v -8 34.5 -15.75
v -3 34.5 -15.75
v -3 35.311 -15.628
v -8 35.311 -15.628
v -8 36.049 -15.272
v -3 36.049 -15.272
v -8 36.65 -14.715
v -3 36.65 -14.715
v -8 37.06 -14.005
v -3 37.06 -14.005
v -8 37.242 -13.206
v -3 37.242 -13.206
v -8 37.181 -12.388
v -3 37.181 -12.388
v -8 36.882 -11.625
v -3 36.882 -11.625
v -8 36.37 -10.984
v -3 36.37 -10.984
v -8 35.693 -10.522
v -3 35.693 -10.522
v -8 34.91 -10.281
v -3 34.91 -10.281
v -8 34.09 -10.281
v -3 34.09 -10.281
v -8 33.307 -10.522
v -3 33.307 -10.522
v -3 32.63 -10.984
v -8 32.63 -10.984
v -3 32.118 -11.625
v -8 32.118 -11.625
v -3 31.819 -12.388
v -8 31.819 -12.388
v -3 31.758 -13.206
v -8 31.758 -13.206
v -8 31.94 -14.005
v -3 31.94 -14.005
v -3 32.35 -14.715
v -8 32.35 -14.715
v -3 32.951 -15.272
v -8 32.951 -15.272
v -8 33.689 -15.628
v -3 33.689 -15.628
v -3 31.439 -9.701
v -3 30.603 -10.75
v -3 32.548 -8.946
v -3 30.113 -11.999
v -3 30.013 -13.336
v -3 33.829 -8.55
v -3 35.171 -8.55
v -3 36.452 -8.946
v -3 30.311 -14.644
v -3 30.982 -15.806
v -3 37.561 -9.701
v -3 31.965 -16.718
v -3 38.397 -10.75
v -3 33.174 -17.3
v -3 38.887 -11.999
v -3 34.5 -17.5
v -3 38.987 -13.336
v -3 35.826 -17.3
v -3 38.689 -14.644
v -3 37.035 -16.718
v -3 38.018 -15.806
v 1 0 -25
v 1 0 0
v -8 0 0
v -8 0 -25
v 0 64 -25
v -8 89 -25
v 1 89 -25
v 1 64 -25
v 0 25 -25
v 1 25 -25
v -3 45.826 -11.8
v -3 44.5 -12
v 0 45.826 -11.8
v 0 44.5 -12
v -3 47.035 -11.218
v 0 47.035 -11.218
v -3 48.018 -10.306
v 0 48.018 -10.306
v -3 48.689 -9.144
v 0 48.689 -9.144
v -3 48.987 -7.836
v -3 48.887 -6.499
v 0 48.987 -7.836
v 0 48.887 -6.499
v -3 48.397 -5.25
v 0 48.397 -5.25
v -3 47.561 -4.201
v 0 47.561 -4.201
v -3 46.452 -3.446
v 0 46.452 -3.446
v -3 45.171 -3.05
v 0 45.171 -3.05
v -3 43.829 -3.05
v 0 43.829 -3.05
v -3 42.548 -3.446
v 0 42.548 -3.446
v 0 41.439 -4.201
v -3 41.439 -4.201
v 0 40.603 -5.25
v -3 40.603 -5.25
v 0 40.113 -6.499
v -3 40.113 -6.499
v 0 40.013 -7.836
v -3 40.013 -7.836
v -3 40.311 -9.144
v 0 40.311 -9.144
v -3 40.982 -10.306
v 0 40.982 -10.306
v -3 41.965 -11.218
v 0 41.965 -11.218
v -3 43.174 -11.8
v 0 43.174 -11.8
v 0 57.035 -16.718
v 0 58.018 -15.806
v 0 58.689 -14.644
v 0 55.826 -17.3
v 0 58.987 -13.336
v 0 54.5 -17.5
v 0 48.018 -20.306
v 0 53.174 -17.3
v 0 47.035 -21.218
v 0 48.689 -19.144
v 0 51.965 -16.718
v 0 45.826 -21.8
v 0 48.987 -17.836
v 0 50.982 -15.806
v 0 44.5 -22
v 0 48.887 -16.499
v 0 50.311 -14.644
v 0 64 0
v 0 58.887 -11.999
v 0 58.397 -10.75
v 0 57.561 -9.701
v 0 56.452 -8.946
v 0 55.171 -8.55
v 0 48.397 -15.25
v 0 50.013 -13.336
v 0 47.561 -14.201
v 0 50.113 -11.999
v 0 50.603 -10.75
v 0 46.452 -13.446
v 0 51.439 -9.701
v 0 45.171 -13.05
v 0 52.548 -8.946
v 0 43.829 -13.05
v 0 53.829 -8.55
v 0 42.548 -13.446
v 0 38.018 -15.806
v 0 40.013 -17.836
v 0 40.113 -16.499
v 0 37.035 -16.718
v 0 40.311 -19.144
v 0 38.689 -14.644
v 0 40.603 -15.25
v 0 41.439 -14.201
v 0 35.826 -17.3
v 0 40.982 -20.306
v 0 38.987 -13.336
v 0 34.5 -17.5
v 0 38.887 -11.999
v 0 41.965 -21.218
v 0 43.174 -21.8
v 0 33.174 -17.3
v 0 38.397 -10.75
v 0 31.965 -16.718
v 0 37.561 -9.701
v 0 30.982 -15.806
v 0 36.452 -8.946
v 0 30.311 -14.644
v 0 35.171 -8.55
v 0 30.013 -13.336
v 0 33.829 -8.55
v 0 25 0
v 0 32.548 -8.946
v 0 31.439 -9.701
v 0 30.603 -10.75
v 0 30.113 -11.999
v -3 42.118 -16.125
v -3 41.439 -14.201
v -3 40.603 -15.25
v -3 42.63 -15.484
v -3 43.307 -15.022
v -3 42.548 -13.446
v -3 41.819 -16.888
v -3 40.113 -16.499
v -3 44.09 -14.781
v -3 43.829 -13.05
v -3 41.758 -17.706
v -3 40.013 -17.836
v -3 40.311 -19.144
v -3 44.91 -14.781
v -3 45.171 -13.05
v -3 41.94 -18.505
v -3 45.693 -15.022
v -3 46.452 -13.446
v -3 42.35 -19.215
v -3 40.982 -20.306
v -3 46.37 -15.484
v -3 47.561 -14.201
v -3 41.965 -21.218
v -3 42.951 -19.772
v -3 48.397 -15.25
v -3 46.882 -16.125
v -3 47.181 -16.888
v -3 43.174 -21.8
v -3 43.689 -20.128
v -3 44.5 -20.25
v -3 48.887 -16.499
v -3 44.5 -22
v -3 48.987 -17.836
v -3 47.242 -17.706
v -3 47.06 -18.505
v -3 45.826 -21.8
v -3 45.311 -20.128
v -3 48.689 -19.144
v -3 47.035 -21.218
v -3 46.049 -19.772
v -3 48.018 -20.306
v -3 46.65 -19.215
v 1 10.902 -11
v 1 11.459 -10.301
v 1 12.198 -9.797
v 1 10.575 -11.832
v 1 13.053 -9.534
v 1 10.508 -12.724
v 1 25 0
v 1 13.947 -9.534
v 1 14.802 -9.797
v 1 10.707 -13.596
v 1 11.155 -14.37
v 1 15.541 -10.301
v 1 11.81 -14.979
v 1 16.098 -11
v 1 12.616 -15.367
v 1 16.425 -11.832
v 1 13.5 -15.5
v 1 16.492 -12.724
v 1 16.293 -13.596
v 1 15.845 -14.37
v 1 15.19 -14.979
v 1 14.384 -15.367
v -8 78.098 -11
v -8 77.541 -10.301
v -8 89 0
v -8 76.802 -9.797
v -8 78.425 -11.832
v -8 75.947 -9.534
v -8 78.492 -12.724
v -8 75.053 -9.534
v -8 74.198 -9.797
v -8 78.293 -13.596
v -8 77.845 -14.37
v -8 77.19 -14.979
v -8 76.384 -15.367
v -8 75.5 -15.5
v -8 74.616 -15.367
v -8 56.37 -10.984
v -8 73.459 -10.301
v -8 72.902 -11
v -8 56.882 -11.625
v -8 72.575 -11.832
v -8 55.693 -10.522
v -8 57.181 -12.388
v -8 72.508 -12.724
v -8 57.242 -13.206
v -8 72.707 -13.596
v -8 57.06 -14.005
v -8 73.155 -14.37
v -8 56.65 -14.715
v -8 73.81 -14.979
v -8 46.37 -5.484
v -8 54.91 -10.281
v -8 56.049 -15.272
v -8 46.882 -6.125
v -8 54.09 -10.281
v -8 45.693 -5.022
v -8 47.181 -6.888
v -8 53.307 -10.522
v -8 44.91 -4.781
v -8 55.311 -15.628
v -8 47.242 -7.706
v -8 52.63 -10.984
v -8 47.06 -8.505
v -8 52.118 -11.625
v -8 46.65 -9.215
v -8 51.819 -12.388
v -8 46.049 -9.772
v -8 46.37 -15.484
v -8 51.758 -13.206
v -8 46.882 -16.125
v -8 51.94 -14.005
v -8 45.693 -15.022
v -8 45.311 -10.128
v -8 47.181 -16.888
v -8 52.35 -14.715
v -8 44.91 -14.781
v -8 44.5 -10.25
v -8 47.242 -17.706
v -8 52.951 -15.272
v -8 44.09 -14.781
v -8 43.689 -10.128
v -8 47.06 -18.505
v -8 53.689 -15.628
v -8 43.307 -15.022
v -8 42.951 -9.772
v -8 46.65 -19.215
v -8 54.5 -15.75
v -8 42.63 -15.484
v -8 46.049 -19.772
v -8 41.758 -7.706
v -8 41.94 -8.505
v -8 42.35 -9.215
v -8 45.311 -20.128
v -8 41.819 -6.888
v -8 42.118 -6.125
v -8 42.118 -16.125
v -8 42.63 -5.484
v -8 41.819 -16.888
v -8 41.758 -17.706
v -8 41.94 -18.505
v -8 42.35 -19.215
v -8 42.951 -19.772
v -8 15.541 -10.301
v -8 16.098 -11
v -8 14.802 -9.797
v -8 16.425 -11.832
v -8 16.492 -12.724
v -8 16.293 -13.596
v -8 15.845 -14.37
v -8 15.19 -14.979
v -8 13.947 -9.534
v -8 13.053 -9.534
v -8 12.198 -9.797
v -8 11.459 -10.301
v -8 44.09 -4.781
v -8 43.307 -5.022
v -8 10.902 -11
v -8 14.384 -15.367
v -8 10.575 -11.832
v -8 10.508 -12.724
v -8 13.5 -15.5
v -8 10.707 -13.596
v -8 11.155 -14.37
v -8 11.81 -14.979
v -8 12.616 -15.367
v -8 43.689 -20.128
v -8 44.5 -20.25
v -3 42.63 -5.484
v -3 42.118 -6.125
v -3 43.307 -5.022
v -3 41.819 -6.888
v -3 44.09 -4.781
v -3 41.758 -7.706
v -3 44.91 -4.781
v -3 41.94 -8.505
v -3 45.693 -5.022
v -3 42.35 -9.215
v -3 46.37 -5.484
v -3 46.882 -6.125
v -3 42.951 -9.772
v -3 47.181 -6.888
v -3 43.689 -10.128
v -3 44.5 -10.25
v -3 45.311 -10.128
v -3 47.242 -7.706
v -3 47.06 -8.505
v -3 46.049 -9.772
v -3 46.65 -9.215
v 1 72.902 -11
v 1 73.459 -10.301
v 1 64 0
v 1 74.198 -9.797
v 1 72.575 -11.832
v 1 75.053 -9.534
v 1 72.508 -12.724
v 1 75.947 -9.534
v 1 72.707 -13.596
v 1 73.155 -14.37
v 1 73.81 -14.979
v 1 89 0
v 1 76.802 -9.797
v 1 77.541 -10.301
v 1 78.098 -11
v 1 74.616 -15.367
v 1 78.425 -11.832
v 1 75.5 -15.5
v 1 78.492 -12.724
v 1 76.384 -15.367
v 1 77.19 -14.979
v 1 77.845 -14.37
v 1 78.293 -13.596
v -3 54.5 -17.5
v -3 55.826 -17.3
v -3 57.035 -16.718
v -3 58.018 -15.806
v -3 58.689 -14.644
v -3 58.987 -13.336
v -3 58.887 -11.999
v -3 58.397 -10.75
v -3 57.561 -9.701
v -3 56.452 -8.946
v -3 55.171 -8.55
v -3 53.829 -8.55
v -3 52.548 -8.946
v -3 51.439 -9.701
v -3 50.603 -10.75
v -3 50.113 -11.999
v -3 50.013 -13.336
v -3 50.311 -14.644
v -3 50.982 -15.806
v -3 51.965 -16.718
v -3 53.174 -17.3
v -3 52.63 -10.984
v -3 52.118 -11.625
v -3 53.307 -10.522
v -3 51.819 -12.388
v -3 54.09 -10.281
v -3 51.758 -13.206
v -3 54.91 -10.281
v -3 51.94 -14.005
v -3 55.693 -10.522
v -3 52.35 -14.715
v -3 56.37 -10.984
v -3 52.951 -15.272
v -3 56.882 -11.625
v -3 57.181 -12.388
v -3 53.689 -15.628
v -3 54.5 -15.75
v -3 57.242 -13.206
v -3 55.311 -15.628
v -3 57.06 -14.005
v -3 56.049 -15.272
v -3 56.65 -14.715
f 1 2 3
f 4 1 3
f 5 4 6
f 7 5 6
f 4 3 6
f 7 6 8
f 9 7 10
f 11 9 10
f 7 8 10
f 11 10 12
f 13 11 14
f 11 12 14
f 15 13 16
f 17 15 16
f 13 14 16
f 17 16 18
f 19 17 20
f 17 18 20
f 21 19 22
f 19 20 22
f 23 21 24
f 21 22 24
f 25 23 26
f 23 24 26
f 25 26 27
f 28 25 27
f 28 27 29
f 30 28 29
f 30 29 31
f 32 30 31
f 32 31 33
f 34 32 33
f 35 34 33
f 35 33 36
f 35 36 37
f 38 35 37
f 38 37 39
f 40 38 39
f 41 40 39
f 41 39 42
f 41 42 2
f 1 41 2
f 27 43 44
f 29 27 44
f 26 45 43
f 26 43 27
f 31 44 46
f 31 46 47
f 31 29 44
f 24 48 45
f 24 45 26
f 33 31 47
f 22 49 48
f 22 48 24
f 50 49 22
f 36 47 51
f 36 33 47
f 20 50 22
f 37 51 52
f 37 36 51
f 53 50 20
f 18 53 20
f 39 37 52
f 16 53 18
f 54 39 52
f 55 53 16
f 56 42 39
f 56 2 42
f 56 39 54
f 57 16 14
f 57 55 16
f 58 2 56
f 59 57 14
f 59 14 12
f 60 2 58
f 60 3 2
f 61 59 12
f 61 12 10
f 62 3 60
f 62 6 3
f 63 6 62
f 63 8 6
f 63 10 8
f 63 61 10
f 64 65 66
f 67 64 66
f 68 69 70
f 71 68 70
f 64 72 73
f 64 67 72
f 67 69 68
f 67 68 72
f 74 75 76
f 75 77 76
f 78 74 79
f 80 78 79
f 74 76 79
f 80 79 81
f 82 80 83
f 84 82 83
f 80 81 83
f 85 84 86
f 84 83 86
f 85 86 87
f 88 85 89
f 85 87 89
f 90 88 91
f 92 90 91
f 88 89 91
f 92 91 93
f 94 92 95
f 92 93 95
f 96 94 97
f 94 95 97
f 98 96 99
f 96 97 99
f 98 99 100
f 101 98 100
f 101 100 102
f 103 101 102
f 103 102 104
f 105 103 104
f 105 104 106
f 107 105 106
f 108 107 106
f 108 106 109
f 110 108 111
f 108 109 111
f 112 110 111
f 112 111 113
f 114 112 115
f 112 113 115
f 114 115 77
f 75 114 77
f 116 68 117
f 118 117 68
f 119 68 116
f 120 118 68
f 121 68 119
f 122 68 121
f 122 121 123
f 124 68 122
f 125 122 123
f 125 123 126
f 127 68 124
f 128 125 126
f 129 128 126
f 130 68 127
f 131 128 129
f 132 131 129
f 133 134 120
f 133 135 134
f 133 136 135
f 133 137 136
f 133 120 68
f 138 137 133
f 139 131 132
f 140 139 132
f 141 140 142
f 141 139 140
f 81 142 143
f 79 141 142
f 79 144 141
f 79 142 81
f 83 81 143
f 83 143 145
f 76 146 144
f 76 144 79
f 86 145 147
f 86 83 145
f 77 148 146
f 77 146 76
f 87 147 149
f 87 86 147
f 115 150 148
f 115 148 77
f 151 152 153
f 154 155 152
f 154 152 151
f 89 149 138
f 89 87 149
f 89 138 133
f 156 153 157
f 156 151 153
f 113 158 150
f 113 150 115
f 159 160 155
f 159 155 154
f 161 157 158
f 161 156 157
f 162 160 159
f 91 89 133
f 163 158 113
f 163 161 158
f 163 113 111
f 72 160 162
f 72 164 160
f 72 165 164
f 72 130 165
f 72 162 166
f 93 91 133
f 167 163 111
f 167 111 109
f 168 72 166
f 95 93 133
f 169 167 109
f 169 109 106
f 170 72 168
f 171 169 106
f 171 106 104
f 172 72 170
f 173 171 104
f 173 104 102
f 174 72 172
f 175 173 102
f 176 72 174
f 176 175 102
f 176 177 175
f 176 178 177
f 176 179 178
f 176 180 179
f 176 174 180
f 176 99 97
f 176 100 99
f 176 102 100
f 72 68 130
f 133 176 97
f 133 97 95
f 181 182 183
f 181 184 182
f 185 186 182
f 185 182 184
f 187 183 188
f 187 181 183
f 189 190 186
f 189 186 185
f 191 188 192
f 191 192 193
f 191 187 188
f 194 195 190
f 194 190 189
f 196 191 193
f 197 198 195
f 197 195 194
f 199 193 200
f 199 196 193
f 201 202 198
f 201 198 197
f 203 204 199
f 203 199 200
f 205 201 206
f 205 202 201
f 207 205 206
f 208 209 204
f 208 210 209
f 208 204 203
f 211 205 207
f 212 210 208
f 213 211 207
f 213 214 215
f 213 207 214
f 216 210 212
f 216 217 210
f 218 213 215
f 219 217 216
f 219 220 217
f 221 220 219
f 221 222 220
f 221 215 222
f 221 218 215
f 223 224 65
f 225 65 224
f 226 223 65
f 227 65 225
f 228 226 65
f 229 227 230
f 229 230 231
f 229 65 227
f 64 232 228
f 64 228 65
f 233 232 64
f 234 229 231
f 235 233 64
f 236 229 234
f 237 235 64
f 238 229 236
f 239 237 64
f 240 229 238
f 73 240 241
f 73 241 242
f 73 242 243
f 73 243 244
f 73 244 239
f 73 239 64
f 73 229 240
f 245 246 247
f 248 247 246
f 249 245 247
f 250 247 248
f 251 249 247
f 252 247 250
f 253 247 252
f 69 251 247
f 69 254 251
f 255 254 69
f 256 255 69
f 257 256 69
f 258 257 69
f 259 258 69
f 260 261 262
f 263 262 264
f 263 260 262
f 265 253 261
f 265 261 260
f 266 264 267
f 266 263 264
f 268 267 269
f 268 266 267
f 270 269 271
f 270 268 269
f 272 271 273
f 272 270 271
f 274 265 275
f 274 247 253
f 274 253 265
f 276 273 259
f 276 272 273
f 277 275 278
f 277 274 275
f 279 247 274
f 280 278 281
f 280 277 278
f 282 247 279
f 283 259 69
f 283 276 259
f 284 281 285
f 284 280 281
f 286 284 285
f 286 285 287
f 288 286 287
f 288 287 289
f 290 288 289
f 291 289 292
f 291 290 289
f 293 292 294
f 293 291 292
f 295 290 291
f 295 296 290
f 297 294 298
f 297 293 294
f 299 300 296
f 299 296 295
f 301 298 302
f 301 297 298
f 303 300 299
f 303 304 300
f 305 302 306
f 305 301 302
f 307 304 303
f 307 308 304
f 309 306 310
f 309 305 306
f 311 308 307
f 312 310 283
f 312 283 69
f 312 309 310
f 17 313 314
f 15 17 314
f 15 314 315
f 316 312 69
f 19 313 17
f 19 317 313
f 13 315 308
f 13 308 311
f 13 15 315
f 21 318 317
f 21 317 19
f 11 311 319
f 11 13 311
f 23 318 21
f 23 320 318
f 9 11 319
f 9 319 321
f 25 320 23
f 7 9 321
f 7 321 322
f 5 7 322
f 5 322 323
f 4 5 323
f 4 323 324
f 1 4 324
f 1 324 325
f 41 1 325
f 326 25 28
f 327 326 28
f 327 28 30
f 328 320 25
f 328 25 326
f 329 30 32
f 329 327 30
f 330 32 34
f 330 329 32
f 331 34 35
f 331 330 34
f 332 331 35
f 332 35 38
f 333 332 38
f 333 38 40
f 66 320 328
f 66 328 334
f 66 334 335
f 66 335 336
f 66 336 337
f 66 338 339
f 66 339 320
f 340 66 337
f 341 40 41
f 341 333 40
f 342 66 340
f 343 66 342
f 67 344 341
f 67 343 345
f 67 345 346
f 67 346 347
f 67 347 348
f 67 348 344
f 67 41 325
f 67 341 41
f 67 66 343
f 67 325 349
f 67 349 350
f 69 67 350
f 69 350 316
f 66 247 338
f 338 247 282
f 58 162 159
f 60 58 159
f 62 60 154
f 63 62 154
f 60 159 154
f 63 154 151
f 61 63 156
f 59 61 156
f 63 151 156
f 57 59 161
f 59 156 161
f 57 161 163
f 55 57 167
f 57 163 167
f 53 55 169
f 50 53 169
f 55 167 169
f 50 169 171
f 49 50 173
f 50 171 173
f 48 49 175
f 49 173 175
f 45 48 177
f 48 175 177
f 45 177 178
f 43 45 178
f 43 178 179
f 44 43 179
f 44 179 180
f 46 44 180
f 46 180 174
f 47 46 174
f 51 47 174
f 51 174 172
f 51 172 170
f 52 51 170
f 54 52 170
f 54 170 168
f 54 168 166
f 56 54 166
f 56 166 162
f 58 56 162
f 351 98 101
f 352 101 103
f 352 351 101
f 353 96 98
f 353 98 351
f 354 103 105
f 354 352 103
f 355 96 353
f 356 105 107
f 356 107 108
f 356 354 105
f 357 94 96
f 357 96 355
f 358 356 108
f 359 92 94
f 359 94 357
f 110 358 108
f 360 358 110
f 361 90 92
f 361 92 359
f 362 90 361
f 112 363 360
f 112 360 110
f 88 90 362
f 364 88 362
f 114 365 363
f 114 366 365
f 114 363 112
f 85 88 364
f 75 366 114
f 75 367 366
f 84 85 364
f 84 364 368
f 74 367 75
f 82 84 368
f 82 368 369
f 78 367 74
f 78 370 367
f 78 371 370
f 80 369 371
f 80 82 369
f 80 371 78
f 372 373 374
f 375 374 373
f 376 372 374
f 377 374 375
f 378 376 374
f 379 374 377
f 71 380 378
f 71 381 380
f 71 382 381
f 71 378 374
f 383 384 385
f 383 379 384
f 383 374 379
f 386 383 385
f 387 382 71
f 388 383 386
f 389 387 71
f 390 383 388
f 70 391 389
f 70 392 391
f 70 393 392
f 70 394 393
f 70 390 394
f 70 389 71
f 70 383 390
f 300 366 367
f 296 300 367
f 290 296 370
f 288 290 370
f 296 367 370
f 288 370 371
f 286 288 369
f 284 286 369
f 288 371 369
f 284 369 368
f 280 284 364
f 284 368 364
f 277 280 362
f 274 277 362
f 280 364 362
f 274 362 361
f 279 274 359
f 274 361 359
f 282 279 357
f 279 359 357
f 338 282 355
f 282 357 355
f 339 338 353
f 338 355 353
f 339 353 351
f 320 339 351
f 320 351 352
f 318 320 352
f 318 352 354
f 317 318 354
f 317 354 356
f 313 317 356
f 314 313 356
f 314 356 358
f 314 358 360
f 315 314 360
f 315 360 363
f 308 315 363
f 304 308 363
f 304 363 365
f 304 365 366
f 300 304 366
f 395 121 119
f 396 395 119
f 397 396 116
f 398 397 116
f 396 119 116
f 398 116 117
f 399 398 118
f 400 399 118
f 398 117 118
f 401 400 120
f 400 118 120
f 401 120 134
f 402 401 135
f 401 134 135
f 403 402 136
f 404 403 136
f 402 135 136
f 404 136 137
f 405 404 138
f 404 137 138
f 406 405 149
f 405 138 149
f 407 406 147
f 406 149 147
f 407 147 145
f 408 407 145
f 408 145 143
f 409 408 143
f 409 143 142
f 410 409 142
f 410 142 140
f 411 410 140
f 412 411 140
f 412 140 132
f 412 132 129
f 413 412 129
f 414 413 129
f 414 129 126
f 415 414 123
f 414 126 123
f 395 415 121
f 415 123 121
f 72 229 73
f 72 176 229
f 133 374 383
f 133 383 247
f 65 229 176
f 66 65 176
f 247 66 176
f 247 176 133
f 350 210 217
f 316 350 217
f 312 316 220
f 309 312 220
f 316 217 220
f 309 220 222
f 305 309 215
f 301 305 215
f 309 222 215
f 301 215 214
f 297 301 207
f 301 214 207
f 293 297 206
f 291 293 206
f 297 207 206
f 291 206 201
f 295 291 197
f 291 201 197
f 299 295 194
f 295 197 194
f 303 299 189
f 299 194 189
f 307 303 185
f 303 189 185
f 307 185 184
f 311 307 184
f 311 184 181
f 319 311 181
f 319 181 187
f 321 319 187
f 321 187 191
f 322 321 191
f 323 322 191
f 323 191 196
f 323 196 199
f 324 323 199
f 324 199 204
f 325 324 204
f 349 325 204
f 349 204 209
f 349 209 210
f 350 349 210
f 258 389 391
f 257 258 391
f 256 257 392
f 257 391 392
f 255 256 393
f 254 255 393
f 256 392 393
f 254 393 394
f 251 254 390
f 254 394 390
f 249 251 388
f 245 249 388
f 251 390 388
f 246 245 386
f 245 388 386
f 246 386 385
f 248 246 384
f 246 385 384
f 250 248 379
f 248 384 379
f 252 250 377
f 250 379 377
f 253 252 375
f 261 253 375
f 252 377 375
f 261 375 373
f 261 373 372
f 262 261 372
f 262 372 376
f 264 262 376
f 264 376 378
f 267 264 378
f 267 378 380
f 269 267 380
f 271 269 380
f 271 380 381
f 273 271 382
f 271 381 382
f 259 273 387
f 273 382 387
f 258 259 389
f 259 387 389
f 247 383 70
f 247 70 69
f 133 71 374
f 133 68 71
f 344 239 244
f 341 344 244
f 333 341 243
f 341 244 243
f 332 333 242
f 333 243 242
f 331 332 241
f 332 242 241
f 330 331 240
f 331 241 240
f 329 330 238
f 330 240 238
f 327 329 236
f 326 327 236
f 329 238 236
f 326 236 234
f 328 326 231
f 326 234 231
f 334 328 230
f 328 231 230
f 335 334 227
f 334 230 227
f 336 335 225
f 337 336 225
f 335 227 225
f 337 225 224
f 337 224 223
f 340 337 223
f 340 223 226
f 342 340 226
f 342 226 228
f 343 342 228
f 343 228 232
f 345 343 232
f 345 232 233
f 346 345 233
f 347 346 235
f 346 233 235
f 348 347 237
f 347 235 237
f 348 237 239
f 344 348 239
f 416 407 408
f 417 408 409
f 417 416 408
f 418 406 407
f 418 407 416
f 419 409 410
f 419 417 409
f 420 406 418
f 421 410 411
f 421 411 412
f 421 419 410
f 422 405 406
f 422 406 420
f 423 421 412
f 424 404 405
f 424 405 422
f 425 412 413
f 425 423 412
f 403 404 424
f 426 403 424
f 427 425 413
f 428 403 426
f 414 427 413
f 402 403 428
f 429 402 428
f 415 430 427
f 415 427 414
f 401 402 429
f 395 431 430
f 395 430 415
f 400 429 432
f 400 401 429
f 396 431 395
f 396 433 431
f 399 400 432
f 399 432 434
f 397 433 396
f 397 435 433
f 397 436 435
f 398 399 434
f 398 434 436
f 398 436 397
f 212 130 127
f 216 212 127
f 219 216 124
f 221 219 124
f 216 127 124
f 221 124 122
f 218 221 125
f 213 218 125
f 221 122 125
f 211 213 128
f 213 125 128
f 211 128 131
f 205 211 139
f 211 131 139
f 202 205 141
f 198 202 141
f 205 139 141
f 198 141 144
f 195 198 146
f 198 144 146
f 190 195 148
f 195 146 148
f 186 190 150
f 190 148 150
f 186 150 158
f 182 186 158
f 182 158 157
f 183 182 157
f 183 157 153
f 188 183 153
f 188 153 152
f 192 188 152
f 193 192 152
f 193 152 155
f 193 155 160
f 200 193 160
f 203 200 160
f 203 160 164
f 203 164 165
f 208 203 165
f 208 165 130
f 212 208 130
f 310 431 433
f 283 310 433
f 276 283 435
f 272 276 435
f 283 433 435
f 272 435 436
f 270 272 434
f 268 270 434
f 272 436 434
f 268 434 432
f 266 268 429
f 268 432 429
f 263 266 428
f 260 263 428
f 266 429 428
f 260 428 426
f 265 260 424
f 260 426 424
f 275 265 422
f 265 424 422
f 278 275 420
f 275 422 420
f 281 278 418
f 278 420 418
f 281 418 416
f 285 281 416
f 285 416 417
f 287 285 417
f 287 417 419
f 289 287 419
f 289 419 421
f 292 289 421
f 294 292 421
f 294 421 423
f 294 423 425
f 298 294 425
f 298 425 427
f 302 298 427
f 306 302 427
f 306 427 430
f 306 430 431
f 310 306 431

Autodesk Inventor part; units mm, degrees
ref_plane "YZ Plane" through (0, 0, 0) normal (1, 0, 0) x (0, 1, 0)
ref_plane "XZ Plane" through (0, 0, 0) normal (0, 1, 0) x (-1, 0, 0)
ref_plane "XY Plane" through (0, 0, 0) normal (0, 0, 1) x (1, 0, 0)
sketch "Sketch1" plane through (0, 0, 0) normal (0, 1, 0) x (-1, 0, 0)
  line L0 (0, 0) -> (8, 0)
  line L1 (8, 0) -> (8, -25)
  line L2 (8, -25) -> (0, -25)
  line L3 (0, -25) -> (0, 0)
  dimension "d0" = 8
  dimension "d1" = 25
extrude "Extrusion1" add sketch "Sketch1" along normal blind 89
sketch "Sketch2" plane through (0, 0, 0) normal (1, 0, 0) x (0, 0, -1)
  line L0 (0, 89) -> (25, 89) projected
  line L1 (0, 89) -> (25, 89)
  line L2 (25, 89) -> (25, 64)
  line L3 (25, 64) -> (0, 64)
  line L4 (0, 64) -> (0, 89)
  line L5 (25, 0) -> (25, 89) projected
  line L6 (25, 0) -> (0, 0)
  line L7 (0, 0) -> (0, 25)
  line L8 (0, 25) -> (25, 25)
  line L9 (25, 25) -> (25, 0)
  dimension "d4" = 25
  dimension "d5" = 25
  dimension "d6" = 25
  dimension "d7" = 25
extrude "Extrusion2" add sketch "Sketch2" along normal blind 1
sketch "Sketch3" plane through (1, 0, 0) normal (1, 0, 0) x (0, 0, -1)
  line L0 (0, 0) -> (25, 0) projected
  line L1 (0, 0) -> (12.5, 0)
  line L2 (12.5, 0) -> (12.5, 13.5)
  circle A0 centre (12.5, 13.5) radius 3
  circle A1 centre (12.5, 75.5) radius 3
  line L3 (25, 89) -> (0, 89) projected
  line L4 (0, 89) -> (0, 64) projected
  dimension "d10" = 13.5
  dimension "d11" = 6
  dimension "d12" = 6
  dimension "d13" = 13.5
  dimension "d14" = 12.5
sketch "Sketch4" plane through (0, 25, -25) normal (1, 0, 0) x (0, 0, -1)
  circle A0 centre (-17.5, 19.5) radius 2.75
  line L0 (-25, -25) -> (0, -25) projected
  line L1 (-25, 0) -> (-25, 39) projected
  circle A1 centre (-7.5, 19.5) radius 2.75
  line L2 (0, 0) -> (0, 39) projected
  circle A2 centre (-12, 9.5) radius 2.75
  circle A3 centre (-12, 29.5) radius 2.75
  dimension "d15" = 5.5
  dimension "d16" = 44.5
  dimension "d17" = 7.5
  dimension "d18" = 5.5
  dimension "d19" = 7.5
  dimension "d20" = 44.5
  dimension "d21" = 5.5
  dimension "d22" = 5.5
  dimension "d23" = 10
  dimension "d24" = 4.5
  dimension "d25" = 10
  dimension "d26" = 4.5
extrude "Extrusion3" cut sketch "Sketch3" against normal up to next
extrude "Extrusion4" cut sketch "Sketch4" against normal up to next
sketch "Sketch6" plane through (0, 25, -25) normal (1, 0, 0) x (0, 0, -1)
  circle A0 centre (-12, 29.5) radius 2.75 projected
  circle A1 centre (-12, 29.5) radius 2.5
  circle A2 centre (-7.5, 19.5) radius 2.75 projected
  circle A3 centre (-7.5, 19.5) radius 2.5
  circle A4 centre (-12, 9.5) radius 2.75 projected
  circle A5 centre (-12, 9.5) radius 2.5
  circle A6 centre (-17.5, 19.5) radius 2.75 projected
  circle A7 centre (-17.5, 19.5) radius 2.5
  circle A8 centre (-17.5, 19.5) radius 4.5
  circle A9 centre (-12, 29.5) radius 4.5
  circle A10 centre (-12, 9.5) radius 4.5
  circle A11 centre (-7.5, 19.5) radius 4.5
  point P0 (-25, -25)
  dimension "d37" = 9
  dimension "d38" = 9
  dimension "d39" = 9
  dimension "d40" = 5.5
  dimension "d41" = 5.5
  dimension "d43" = 9
extrude "Extrusion6" cut sketch "Sketch6" against normal blind 3 contours A8 | A9 | A10 | A11
properties part number "Back_Bracket_40mm" material "ABS Plastic"
